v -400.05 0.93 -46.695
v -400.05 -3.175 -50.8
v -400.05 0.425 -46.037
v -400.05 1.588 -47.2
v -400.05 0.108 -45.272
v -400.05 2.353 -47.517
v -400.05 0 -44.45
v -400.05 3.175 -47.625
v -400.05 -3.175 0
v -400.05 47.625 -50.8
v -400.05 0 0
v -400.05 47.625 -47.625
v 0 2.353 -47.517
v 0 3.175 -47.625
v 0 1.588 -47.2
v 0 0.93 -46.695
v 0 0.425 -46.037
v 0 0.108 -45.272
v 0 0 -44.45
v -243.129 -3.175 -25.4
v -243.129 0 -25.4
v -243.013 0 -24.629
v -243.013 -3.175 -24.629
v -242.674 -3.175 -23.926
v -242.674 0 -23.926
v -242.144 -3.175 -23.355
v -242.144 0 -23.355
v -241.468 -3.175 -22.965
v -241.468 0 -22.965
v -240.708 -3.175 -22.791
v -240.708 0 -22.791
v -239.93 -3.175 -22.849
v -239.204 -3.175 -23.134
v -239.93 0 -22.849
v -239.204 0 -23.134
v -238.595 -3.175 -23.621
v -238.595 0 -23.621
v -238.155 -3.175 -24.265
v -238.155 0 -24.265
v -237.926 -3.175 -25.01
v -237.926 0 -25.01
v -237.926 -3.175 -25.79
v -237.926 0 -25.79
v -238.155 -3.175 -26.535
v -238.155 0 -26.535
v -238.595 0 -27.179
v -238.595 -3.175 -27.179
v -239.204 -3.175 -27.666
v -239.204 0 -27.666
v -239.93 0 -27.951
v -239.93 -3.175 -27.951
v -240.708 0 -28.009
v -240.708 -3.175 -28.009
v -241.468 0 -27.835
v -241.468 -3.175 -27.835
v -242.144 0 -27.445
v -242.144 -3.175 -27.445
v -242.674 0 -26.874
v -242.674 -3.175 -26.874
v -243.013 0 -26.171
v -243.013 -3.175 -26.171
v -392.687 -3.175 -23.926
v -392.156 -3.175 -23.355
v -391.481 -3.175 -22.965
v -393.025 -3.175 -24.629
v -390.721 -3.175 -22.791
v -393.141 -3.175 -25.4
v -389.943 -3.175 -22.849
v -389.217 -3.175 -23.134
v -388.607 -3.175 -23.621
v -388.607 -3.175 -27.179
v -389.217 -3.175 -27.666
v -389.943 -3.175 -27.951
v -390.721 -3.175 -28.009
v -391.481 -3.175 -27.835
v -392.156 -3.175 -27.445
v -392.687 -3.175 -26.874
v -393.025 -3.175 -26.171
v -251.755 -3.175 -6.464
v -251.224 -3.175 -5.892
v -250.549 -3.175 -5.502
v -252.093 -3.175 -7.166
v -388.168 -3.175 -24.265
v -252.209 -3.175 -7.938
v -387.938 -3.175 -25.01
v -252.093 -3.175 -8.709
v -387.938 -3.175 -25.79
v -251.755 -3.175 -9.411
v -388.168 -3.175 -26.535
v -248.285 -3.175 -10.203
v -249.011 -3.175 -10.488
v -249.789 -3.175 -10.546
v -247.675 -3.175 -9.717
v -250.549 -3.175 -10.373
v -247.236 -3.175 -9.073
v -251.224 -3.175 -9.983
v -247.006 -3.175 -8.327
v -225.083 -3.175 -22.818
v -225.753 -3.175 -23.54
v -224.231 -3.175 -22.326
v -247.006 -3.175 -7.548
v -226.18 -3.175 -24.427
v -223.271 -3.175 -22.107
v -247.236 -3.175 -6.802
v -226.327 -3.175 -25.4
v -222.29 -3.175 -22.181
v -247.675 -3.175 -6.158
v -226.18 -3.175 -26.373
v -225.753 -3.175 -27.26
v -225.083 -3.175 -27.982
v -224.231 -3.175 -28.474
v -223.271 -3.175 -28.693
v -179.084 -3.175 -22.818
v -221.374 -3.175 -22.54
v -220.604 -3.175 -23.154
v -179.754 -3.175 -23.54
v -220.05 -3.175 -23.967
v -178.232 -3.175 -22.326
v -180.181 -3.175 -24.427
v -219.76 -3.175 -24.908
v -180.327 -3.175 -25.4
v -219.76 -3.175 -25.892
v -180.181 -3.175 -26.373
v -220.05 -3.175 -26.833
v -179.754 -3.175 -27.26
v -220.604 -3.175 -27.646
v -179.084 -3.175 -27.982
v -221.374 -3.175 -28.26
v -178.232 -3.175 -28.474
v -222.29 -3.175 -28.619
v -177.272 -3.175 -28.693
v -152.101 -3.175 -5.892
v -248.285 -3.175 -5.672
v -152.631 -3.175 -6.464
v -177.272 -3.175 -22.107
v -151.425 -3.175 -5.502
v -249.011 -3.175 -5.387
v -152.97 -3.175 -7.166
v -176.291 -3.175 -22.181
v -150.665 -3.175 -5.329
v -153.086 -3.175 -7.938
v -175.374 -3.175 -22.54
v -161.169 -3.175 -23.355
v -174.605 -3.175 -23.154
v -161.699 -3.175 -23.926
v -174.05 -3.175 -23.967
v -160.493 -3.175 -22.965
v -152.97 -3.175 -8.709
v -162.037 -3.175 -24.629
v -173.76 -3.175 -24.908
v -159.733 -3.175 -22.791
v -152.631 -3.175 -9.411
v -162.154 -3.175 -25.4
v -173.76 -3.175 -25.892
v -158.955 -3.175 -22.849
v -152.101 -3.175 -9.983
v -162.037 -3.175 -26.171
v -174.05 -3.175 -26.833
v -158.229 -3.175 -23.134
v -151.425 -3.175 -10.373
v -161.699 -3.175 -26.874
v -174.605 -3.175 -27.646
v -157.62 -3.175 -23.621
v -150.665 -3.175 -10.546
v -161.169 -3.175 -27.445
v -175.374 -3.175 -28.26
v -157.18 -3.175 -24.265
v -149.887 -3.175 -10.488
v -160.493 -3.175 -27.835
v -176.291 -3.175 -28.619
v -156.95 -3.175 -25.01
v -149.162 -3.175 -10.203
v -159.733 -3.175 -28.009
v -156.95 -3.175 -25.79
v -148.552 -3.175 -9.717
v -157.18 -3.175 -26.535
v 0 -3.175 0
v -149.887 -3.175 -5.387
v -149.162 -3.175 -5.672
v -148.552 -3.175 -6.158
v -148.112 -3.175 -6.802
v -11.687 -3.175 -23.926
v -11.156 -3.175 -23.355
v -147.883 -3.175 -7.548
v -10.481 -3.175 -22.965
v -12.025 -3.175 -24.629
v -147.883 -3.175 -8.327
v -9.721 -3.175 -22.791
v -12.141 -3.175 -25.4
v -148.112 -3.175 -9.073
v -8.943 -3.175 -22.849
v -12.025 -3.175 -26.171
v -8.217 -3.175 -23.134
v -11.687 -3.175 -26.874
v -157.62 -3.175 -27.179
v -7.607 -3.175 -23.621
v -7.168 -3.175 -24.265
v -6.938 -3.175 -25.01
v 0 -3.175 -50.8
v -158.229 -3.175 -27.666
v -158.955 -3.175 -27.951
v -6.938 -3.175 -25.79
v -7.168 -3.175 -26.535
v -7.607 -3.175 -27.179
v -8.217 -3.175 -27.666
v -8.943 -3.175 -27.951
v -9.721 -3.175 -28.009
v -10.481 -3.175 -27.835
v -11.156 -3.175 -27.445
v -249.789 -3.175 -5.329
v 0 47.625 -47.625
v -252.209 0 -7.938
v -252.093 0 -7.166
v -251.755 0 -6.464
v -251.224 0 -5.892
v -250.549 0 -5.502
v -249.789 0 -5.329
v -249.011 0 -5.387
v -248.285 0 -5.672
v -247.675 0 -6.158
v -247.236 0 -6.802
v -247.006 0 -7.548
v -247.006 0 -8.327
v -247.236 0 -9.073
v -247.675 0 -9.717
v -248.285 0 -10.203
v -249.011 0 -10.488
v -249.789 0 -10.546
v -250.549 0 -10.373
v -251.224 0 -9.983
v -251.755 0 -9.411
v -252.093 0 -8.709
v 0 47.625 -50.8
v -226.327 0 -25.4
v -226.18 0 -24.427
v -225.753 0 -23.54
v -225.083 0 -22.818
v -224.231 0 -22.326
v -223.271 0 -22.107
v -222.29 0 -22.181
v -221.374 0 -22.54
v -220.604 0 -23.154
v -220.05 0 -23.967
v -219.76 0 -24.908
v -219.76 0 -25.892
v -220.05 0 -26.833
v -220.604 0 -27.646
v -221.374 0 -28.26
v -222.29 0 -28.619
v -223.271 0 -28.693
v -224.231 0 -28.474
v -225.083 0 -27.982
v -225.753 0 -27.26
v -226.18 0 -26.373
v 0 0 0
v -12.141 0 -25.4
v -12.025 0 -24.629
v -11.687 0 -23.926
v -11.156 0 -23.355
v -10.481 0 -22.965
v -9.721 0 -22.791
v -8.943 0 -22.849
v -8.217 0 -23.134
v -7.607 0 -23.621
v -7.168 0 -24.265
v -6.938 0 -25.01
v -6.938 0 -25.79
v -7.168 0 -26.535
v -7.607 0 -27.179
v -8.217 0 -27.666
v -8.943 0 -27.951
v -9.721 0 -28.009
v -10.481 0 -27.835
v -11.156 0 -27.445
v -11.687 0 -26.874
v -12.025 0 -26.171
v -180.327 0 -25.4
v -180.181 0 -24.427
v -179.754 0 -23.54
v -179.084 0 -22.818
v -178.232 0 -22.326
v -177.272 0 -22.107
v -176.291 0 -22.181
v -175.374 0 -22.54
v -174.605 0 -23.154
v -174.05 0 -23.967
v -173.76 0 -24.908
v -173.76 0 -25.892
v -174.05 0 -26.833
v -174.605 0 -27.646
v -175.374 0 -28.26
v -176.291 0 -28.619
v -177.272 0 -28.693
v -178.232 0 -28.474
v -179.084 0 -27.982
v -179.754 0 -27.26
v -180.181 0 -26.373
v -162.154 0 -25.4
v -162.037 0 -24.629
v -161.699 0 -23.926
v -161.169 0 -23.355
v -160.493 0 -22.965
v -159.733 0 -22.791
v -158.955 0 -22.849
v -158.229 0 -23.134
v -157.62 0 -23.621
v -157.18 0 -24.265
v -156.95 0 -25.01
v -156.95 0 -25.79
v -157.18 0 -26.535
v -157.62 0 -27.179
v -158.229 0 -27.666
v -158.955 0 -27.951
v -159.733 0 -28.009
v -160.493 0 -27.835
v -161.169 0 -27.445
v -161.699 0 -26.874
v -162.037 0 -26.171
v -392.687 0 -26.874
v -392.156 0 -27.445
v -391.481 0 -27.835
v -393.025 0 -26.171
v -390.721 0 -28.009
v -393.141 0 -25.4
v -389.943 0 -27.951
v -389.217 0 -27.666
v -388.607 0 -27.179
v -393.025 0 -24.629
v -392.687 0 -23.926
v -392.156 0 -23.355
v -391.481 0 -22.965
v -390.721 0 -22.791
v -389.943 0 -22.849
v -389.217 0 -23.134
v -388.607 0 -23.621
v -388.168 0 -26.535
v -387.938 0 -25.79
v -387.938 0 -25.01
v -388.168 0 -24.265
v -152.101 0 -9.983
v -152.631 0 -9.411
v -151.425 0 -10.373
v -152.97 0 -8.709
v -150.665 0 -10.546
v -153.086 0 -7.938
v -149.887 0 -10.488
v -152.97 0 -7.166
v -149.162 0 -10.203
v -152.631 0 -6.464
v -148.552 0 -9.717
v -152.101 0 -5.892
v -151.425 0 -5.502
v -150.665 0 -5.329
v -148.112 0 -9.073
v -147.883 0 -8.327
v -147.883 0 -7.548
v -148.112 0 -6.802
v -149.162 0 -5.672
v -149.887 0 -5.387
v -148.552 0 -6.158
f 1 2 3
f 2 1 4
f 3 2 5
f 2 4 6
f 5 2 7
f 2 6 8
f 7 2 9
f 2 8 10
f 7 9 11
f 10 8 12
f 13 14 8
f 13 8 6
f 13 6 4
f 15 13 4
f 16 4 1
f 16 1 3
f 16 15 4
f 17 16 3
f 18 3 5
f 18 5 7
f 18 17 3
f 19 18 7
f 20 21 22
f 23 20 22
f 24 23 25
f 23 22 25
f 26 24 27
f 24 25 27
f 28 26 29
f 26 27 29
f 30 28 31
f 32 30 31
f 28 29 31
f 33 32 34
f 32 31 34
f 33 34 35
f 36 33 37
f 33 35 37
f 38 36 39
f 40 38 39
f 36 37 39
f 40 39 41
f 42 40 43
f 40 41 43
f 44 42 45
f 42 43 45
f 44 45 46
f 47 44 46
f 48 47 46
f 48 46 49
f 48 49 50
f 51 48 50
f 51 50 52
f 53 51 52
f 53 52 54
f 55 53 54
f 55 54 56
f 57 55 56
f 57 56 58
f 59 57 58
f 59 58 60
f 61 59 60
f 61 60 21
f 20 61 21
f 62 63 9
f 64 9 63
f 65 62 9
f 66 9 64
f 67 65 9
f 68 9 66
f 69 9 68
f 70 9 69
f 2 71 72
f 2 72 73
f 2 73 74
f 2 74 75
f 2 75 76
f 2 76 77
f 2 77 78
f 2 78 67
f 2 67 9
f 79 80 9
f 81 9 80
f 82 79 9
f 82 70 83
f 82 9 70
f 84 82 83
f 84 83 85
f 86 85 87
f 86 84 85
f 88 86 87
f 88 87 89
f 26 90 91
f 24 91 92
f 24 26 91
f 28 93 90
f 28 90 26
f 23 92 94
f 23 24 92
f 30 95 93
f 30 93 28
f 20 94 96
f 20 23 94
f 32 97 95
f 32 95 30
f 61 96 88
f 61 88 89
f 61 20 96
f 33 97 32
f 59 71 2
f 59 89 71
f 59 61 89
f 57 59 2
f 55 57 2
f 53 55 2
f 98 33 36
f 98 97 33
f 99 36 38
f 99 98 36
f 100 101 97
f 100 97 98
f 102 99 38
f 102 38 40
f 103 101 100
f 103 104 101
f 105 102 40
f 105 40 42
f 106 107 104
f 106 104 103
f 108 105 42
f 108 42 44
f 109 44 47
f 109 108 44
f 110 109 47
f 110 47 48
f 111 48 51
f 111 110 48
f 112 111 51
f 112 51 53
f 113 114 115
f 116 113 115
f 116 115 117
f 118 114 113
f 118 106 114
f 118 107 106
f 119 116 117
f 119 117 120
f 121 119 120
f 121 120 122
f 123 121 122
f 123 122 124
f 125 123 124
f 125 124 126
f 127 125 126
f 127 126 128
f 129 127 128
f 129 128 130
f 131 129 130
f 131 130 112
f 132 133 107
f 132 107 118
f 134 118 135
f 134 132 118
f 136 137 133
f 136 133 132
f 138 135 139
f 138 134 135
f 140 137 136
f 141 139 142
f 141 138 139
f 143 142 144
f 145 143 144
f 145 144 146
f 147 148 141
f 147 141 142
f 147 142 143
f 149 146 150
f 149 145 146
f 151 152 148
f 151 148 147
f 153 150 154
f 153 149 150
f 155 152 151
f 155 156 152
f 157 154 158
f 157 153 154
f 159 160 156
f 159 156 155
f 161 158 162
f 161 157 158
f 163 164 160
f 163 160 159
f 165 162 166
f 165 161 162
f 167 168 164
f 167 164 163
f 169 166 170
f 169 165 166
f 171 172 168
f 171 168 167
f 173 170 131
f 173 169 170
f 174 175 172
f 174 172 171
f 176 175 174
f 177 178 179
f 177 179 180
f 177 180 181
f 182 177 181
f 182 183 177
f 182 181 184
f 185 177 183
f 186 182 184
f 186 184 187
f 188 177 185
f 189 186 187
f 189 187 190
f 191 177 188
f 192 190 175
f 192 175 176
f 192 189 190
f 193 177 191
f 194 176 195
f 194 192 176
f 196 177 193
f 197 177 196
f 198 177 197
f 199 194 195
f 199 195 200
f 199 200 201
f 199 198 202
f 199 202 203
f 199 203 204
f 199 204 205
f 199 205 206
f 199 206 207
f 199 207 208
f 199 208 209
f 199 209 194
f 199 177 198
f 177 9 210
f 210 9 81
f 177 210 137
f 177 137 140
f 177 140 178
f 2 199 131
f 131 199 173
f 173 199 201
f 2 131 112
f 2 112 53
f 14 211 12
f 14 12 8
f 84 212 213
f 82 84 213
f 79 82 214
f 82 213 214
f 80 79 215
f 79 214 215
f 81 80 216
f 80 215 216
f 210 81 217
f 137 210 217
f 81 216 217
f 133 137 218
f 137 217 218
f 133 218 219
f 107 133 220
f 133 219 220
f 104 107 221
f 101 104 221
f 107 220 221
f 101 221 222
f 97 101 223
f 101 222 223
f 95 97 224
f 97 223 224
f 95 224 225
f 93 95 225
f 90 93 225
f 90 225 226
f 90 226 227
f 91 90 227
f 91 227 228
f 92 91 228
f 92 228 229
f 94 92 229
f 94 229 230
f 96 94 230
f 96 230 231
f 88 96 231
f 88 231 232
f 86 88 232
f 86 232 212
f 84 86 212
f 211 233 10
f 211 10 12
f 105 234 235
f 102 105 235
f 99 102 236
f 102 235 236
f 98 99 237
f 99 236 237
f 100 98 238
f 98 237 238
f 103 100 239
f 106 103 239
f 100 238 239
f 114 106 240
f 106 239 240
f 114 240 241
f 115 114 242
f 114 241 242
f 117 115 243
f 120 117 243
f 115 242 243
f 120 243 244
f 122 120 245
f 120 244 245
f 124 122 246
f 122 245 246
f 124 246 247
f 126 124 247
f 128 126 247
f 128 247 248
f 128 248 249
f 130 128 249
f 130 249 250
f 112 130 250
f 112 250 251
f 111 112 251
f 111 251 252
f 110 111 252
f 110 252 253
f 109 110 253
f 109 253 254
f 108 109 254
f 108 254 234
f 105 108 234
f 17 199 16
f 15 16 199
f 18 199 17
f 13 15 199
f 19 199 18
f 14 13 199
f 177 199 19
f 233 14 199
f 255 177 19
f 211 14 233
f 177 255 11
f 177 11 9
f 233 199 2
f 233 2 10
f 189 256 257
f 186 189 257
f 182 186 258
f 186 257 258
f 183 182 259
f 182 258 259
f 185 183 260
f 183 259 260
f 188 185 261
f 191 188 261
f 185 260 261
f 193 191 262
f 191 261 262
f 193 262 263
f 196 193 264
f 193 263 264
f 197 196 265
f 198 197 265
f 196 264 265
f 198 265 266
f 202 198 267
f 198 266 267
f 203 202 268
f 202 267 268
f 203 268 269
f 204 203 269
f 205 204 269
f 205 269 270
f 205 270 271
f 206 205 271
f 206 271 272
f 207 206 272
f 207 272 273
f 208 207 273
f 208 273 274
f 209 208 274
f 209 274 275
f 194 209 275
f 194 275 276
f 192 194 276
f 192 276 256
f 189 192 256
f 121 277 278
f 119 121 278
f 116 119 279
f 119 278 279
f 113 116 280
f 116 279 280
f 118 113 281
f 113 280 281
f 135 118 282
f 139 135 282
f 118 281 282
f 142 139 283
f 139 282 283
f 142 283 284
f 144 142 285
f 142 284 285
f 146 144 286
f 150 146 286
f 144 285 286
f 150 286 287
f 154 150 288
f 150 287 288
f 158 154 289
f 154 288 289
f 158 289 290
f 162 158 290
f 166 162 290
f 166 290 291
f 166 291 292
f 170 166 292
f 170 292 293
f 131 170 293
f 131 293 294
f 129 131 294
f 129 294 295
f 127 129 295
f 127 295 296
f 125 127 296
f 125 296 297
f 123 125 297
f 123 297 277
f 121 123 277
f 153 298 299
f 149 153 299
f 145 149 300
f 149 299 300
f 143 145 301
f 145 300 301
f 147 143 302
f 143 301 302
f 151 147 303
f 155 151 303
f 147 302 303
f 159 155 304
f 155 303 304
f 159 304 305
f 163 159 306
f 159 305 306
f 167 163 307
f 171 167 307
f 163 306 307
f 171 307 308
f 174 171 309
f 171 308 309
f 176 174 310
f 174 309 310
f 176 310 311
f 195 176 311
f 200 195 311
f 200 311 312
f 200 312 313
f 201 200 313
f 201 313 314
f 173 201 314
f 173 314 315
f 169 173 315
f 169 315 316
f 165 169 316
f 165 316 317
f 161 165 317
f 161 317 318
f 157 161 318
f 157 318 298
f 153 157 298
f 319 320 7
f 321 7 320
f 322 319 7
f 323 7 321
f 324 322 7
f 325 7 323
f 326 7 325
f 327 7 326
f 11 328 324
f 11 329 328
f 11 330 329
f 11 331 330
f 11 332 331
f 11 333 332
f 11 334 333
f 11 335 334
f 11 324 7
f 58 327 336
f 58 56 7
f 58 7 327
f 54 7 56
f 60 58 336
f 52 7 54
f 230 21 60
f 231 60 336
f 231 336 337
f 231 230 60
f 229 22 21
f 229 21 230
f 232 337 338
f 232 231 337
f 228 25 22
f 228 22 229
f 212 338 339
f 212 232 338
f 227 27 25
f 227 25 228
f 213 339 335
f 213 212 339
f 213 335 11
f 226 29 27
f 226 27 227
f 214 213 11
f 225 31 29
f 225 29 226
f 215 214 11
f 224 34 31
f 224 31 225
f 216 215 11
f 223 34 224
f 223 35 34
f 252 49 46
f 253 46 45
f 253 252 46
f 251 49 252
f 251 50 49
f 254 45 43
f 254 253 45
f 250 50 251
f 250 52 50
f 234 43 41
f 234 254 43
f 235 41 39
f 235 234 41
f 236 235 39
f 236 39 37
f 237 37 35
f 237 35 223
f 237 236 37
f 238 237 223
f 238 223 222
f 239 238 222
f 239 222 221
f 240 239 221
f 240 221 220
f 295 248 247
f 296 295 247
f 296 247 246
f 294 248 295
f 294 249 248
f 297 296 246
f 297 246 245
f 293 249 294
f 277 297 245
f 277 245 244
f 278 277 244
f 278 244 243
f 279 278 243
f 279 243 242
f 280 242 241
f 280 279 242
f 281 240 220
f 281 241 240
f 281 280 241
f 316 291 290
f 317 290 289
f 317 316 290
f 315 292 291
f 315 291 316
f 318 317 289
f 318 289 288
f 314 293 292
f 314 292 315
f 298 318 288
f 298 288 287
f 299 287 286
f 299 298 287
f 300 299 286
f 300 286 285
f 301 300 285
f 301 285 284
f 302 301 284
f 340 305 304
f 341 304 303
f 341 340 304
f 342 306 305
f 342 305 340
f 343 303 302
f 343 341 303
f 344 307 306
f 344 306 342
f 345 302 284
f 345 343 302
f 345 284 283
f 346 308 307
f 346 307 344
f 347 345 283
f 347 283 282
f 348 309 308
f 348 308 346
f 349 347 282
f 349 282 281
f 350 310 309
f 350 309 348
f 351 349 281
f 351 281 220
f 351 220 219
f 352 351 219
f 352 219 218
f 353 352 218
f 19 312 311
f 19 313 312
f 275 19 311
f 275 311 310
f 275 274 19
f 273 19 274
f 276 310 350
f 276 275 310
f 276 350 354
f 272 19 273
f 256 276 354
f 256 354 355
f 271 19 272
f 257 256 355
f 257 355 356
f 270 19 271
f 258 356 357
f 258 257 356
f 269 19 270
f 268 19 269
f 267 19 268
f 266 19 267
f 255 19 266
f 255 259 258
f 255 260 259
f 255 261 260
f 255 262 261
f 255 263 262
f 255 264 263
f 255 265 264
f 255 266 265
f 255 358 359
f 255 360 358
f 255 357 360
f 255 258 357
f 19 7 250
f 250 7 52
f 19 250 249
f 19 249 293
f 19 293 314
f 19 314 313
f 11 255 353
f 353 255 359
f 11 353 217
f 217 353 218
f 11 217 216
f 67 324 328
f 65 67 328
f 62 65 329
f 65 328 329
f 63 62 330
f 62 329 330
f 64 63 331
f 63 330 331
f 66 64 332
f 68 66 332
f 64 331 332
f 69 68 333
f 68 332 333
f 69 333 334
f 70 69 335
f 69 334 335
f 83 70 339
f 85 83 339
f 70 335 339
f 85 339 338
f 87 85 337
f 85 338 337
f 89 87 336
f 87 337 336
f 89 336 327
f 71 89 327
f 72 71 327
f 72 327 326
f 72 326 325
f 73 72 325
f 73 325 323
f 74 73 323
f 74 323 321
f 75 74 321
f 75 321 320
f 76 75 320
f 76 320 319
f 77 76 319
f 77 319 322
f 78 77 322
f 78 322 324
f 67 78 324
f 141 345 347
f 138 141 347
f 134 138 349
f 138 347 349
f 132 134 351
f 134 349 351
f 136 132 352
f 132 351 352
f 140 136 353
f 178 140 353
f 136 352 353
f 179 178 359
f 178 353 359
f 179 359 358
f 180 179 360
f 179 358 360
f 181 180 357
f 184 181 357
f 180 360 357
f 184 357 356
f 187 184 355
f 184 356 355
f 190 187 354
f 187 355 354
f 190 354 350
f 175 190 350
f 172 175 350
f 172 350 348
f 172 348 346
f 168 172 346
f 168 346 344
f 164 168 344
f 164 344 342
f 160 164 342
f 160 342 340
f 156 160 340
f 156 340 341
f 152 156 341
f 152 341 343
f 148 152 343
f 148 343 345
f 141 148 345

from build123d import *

# Parameters (mm, degrees)
F1_DEPTH = 400.05
F2_R     = 2.6162
F2_R_2   = 3.302
F3_DEPTH = 3.176


with BuildPart() as f1:
    # F0 (on Right) → F1 (new body)
    with BuildSketch(Plane.YZ):
        with BuildLine():
            Line((0, -44.45), (0, 0))
            Line((0, 0), (-3.175, 0))
            Line((-3.175, 0), (-3.175, -50.8))
            Line((-3.175, -50.8), (47.625, -50.8))
            Line((47.625, -50.8), (47.625, -47.625))
            Line((47.625, -47.625), (3.175, -47.625))
            ThreePointArc((3.175, -47.625), (0.929936, -46.695064), (0, -44.45))
        make_face()
    extrude(amount=-F1_DEPTH)

    # F2 (on face) → F3 (cut, through all)
    with BuildSketch(Plane(origin=(0, 0, 0), x_dir=(-1, 0, 0), z_dir=(0, 1, 0))):
        with Locations((9.525, -25.4)):
            Circle(F2_R)
        with Locations((390.525, -25.4)):
            Circle(F2_R)
        with Locations((159.5374, -25.4)):
            Circle(F2_R)
        with Locations((240.5126, -25.4)):
            Circle(F2_R)
        with Locations((223.0247, -25.4)):
            Circle(F2_R_2)
        with Locations((177.0253, -25.4)):
            Circle(F2_R_2)
        with Locations((249.5931, -7.9375)):
            Circle(F2_R)
        with Locations((150.4696, -7.9375)):
            Circle(F2_R)
    extrude(amount=-F3_DEPTH, mode=Mode.SUBTRACT)


solid = f1.part
